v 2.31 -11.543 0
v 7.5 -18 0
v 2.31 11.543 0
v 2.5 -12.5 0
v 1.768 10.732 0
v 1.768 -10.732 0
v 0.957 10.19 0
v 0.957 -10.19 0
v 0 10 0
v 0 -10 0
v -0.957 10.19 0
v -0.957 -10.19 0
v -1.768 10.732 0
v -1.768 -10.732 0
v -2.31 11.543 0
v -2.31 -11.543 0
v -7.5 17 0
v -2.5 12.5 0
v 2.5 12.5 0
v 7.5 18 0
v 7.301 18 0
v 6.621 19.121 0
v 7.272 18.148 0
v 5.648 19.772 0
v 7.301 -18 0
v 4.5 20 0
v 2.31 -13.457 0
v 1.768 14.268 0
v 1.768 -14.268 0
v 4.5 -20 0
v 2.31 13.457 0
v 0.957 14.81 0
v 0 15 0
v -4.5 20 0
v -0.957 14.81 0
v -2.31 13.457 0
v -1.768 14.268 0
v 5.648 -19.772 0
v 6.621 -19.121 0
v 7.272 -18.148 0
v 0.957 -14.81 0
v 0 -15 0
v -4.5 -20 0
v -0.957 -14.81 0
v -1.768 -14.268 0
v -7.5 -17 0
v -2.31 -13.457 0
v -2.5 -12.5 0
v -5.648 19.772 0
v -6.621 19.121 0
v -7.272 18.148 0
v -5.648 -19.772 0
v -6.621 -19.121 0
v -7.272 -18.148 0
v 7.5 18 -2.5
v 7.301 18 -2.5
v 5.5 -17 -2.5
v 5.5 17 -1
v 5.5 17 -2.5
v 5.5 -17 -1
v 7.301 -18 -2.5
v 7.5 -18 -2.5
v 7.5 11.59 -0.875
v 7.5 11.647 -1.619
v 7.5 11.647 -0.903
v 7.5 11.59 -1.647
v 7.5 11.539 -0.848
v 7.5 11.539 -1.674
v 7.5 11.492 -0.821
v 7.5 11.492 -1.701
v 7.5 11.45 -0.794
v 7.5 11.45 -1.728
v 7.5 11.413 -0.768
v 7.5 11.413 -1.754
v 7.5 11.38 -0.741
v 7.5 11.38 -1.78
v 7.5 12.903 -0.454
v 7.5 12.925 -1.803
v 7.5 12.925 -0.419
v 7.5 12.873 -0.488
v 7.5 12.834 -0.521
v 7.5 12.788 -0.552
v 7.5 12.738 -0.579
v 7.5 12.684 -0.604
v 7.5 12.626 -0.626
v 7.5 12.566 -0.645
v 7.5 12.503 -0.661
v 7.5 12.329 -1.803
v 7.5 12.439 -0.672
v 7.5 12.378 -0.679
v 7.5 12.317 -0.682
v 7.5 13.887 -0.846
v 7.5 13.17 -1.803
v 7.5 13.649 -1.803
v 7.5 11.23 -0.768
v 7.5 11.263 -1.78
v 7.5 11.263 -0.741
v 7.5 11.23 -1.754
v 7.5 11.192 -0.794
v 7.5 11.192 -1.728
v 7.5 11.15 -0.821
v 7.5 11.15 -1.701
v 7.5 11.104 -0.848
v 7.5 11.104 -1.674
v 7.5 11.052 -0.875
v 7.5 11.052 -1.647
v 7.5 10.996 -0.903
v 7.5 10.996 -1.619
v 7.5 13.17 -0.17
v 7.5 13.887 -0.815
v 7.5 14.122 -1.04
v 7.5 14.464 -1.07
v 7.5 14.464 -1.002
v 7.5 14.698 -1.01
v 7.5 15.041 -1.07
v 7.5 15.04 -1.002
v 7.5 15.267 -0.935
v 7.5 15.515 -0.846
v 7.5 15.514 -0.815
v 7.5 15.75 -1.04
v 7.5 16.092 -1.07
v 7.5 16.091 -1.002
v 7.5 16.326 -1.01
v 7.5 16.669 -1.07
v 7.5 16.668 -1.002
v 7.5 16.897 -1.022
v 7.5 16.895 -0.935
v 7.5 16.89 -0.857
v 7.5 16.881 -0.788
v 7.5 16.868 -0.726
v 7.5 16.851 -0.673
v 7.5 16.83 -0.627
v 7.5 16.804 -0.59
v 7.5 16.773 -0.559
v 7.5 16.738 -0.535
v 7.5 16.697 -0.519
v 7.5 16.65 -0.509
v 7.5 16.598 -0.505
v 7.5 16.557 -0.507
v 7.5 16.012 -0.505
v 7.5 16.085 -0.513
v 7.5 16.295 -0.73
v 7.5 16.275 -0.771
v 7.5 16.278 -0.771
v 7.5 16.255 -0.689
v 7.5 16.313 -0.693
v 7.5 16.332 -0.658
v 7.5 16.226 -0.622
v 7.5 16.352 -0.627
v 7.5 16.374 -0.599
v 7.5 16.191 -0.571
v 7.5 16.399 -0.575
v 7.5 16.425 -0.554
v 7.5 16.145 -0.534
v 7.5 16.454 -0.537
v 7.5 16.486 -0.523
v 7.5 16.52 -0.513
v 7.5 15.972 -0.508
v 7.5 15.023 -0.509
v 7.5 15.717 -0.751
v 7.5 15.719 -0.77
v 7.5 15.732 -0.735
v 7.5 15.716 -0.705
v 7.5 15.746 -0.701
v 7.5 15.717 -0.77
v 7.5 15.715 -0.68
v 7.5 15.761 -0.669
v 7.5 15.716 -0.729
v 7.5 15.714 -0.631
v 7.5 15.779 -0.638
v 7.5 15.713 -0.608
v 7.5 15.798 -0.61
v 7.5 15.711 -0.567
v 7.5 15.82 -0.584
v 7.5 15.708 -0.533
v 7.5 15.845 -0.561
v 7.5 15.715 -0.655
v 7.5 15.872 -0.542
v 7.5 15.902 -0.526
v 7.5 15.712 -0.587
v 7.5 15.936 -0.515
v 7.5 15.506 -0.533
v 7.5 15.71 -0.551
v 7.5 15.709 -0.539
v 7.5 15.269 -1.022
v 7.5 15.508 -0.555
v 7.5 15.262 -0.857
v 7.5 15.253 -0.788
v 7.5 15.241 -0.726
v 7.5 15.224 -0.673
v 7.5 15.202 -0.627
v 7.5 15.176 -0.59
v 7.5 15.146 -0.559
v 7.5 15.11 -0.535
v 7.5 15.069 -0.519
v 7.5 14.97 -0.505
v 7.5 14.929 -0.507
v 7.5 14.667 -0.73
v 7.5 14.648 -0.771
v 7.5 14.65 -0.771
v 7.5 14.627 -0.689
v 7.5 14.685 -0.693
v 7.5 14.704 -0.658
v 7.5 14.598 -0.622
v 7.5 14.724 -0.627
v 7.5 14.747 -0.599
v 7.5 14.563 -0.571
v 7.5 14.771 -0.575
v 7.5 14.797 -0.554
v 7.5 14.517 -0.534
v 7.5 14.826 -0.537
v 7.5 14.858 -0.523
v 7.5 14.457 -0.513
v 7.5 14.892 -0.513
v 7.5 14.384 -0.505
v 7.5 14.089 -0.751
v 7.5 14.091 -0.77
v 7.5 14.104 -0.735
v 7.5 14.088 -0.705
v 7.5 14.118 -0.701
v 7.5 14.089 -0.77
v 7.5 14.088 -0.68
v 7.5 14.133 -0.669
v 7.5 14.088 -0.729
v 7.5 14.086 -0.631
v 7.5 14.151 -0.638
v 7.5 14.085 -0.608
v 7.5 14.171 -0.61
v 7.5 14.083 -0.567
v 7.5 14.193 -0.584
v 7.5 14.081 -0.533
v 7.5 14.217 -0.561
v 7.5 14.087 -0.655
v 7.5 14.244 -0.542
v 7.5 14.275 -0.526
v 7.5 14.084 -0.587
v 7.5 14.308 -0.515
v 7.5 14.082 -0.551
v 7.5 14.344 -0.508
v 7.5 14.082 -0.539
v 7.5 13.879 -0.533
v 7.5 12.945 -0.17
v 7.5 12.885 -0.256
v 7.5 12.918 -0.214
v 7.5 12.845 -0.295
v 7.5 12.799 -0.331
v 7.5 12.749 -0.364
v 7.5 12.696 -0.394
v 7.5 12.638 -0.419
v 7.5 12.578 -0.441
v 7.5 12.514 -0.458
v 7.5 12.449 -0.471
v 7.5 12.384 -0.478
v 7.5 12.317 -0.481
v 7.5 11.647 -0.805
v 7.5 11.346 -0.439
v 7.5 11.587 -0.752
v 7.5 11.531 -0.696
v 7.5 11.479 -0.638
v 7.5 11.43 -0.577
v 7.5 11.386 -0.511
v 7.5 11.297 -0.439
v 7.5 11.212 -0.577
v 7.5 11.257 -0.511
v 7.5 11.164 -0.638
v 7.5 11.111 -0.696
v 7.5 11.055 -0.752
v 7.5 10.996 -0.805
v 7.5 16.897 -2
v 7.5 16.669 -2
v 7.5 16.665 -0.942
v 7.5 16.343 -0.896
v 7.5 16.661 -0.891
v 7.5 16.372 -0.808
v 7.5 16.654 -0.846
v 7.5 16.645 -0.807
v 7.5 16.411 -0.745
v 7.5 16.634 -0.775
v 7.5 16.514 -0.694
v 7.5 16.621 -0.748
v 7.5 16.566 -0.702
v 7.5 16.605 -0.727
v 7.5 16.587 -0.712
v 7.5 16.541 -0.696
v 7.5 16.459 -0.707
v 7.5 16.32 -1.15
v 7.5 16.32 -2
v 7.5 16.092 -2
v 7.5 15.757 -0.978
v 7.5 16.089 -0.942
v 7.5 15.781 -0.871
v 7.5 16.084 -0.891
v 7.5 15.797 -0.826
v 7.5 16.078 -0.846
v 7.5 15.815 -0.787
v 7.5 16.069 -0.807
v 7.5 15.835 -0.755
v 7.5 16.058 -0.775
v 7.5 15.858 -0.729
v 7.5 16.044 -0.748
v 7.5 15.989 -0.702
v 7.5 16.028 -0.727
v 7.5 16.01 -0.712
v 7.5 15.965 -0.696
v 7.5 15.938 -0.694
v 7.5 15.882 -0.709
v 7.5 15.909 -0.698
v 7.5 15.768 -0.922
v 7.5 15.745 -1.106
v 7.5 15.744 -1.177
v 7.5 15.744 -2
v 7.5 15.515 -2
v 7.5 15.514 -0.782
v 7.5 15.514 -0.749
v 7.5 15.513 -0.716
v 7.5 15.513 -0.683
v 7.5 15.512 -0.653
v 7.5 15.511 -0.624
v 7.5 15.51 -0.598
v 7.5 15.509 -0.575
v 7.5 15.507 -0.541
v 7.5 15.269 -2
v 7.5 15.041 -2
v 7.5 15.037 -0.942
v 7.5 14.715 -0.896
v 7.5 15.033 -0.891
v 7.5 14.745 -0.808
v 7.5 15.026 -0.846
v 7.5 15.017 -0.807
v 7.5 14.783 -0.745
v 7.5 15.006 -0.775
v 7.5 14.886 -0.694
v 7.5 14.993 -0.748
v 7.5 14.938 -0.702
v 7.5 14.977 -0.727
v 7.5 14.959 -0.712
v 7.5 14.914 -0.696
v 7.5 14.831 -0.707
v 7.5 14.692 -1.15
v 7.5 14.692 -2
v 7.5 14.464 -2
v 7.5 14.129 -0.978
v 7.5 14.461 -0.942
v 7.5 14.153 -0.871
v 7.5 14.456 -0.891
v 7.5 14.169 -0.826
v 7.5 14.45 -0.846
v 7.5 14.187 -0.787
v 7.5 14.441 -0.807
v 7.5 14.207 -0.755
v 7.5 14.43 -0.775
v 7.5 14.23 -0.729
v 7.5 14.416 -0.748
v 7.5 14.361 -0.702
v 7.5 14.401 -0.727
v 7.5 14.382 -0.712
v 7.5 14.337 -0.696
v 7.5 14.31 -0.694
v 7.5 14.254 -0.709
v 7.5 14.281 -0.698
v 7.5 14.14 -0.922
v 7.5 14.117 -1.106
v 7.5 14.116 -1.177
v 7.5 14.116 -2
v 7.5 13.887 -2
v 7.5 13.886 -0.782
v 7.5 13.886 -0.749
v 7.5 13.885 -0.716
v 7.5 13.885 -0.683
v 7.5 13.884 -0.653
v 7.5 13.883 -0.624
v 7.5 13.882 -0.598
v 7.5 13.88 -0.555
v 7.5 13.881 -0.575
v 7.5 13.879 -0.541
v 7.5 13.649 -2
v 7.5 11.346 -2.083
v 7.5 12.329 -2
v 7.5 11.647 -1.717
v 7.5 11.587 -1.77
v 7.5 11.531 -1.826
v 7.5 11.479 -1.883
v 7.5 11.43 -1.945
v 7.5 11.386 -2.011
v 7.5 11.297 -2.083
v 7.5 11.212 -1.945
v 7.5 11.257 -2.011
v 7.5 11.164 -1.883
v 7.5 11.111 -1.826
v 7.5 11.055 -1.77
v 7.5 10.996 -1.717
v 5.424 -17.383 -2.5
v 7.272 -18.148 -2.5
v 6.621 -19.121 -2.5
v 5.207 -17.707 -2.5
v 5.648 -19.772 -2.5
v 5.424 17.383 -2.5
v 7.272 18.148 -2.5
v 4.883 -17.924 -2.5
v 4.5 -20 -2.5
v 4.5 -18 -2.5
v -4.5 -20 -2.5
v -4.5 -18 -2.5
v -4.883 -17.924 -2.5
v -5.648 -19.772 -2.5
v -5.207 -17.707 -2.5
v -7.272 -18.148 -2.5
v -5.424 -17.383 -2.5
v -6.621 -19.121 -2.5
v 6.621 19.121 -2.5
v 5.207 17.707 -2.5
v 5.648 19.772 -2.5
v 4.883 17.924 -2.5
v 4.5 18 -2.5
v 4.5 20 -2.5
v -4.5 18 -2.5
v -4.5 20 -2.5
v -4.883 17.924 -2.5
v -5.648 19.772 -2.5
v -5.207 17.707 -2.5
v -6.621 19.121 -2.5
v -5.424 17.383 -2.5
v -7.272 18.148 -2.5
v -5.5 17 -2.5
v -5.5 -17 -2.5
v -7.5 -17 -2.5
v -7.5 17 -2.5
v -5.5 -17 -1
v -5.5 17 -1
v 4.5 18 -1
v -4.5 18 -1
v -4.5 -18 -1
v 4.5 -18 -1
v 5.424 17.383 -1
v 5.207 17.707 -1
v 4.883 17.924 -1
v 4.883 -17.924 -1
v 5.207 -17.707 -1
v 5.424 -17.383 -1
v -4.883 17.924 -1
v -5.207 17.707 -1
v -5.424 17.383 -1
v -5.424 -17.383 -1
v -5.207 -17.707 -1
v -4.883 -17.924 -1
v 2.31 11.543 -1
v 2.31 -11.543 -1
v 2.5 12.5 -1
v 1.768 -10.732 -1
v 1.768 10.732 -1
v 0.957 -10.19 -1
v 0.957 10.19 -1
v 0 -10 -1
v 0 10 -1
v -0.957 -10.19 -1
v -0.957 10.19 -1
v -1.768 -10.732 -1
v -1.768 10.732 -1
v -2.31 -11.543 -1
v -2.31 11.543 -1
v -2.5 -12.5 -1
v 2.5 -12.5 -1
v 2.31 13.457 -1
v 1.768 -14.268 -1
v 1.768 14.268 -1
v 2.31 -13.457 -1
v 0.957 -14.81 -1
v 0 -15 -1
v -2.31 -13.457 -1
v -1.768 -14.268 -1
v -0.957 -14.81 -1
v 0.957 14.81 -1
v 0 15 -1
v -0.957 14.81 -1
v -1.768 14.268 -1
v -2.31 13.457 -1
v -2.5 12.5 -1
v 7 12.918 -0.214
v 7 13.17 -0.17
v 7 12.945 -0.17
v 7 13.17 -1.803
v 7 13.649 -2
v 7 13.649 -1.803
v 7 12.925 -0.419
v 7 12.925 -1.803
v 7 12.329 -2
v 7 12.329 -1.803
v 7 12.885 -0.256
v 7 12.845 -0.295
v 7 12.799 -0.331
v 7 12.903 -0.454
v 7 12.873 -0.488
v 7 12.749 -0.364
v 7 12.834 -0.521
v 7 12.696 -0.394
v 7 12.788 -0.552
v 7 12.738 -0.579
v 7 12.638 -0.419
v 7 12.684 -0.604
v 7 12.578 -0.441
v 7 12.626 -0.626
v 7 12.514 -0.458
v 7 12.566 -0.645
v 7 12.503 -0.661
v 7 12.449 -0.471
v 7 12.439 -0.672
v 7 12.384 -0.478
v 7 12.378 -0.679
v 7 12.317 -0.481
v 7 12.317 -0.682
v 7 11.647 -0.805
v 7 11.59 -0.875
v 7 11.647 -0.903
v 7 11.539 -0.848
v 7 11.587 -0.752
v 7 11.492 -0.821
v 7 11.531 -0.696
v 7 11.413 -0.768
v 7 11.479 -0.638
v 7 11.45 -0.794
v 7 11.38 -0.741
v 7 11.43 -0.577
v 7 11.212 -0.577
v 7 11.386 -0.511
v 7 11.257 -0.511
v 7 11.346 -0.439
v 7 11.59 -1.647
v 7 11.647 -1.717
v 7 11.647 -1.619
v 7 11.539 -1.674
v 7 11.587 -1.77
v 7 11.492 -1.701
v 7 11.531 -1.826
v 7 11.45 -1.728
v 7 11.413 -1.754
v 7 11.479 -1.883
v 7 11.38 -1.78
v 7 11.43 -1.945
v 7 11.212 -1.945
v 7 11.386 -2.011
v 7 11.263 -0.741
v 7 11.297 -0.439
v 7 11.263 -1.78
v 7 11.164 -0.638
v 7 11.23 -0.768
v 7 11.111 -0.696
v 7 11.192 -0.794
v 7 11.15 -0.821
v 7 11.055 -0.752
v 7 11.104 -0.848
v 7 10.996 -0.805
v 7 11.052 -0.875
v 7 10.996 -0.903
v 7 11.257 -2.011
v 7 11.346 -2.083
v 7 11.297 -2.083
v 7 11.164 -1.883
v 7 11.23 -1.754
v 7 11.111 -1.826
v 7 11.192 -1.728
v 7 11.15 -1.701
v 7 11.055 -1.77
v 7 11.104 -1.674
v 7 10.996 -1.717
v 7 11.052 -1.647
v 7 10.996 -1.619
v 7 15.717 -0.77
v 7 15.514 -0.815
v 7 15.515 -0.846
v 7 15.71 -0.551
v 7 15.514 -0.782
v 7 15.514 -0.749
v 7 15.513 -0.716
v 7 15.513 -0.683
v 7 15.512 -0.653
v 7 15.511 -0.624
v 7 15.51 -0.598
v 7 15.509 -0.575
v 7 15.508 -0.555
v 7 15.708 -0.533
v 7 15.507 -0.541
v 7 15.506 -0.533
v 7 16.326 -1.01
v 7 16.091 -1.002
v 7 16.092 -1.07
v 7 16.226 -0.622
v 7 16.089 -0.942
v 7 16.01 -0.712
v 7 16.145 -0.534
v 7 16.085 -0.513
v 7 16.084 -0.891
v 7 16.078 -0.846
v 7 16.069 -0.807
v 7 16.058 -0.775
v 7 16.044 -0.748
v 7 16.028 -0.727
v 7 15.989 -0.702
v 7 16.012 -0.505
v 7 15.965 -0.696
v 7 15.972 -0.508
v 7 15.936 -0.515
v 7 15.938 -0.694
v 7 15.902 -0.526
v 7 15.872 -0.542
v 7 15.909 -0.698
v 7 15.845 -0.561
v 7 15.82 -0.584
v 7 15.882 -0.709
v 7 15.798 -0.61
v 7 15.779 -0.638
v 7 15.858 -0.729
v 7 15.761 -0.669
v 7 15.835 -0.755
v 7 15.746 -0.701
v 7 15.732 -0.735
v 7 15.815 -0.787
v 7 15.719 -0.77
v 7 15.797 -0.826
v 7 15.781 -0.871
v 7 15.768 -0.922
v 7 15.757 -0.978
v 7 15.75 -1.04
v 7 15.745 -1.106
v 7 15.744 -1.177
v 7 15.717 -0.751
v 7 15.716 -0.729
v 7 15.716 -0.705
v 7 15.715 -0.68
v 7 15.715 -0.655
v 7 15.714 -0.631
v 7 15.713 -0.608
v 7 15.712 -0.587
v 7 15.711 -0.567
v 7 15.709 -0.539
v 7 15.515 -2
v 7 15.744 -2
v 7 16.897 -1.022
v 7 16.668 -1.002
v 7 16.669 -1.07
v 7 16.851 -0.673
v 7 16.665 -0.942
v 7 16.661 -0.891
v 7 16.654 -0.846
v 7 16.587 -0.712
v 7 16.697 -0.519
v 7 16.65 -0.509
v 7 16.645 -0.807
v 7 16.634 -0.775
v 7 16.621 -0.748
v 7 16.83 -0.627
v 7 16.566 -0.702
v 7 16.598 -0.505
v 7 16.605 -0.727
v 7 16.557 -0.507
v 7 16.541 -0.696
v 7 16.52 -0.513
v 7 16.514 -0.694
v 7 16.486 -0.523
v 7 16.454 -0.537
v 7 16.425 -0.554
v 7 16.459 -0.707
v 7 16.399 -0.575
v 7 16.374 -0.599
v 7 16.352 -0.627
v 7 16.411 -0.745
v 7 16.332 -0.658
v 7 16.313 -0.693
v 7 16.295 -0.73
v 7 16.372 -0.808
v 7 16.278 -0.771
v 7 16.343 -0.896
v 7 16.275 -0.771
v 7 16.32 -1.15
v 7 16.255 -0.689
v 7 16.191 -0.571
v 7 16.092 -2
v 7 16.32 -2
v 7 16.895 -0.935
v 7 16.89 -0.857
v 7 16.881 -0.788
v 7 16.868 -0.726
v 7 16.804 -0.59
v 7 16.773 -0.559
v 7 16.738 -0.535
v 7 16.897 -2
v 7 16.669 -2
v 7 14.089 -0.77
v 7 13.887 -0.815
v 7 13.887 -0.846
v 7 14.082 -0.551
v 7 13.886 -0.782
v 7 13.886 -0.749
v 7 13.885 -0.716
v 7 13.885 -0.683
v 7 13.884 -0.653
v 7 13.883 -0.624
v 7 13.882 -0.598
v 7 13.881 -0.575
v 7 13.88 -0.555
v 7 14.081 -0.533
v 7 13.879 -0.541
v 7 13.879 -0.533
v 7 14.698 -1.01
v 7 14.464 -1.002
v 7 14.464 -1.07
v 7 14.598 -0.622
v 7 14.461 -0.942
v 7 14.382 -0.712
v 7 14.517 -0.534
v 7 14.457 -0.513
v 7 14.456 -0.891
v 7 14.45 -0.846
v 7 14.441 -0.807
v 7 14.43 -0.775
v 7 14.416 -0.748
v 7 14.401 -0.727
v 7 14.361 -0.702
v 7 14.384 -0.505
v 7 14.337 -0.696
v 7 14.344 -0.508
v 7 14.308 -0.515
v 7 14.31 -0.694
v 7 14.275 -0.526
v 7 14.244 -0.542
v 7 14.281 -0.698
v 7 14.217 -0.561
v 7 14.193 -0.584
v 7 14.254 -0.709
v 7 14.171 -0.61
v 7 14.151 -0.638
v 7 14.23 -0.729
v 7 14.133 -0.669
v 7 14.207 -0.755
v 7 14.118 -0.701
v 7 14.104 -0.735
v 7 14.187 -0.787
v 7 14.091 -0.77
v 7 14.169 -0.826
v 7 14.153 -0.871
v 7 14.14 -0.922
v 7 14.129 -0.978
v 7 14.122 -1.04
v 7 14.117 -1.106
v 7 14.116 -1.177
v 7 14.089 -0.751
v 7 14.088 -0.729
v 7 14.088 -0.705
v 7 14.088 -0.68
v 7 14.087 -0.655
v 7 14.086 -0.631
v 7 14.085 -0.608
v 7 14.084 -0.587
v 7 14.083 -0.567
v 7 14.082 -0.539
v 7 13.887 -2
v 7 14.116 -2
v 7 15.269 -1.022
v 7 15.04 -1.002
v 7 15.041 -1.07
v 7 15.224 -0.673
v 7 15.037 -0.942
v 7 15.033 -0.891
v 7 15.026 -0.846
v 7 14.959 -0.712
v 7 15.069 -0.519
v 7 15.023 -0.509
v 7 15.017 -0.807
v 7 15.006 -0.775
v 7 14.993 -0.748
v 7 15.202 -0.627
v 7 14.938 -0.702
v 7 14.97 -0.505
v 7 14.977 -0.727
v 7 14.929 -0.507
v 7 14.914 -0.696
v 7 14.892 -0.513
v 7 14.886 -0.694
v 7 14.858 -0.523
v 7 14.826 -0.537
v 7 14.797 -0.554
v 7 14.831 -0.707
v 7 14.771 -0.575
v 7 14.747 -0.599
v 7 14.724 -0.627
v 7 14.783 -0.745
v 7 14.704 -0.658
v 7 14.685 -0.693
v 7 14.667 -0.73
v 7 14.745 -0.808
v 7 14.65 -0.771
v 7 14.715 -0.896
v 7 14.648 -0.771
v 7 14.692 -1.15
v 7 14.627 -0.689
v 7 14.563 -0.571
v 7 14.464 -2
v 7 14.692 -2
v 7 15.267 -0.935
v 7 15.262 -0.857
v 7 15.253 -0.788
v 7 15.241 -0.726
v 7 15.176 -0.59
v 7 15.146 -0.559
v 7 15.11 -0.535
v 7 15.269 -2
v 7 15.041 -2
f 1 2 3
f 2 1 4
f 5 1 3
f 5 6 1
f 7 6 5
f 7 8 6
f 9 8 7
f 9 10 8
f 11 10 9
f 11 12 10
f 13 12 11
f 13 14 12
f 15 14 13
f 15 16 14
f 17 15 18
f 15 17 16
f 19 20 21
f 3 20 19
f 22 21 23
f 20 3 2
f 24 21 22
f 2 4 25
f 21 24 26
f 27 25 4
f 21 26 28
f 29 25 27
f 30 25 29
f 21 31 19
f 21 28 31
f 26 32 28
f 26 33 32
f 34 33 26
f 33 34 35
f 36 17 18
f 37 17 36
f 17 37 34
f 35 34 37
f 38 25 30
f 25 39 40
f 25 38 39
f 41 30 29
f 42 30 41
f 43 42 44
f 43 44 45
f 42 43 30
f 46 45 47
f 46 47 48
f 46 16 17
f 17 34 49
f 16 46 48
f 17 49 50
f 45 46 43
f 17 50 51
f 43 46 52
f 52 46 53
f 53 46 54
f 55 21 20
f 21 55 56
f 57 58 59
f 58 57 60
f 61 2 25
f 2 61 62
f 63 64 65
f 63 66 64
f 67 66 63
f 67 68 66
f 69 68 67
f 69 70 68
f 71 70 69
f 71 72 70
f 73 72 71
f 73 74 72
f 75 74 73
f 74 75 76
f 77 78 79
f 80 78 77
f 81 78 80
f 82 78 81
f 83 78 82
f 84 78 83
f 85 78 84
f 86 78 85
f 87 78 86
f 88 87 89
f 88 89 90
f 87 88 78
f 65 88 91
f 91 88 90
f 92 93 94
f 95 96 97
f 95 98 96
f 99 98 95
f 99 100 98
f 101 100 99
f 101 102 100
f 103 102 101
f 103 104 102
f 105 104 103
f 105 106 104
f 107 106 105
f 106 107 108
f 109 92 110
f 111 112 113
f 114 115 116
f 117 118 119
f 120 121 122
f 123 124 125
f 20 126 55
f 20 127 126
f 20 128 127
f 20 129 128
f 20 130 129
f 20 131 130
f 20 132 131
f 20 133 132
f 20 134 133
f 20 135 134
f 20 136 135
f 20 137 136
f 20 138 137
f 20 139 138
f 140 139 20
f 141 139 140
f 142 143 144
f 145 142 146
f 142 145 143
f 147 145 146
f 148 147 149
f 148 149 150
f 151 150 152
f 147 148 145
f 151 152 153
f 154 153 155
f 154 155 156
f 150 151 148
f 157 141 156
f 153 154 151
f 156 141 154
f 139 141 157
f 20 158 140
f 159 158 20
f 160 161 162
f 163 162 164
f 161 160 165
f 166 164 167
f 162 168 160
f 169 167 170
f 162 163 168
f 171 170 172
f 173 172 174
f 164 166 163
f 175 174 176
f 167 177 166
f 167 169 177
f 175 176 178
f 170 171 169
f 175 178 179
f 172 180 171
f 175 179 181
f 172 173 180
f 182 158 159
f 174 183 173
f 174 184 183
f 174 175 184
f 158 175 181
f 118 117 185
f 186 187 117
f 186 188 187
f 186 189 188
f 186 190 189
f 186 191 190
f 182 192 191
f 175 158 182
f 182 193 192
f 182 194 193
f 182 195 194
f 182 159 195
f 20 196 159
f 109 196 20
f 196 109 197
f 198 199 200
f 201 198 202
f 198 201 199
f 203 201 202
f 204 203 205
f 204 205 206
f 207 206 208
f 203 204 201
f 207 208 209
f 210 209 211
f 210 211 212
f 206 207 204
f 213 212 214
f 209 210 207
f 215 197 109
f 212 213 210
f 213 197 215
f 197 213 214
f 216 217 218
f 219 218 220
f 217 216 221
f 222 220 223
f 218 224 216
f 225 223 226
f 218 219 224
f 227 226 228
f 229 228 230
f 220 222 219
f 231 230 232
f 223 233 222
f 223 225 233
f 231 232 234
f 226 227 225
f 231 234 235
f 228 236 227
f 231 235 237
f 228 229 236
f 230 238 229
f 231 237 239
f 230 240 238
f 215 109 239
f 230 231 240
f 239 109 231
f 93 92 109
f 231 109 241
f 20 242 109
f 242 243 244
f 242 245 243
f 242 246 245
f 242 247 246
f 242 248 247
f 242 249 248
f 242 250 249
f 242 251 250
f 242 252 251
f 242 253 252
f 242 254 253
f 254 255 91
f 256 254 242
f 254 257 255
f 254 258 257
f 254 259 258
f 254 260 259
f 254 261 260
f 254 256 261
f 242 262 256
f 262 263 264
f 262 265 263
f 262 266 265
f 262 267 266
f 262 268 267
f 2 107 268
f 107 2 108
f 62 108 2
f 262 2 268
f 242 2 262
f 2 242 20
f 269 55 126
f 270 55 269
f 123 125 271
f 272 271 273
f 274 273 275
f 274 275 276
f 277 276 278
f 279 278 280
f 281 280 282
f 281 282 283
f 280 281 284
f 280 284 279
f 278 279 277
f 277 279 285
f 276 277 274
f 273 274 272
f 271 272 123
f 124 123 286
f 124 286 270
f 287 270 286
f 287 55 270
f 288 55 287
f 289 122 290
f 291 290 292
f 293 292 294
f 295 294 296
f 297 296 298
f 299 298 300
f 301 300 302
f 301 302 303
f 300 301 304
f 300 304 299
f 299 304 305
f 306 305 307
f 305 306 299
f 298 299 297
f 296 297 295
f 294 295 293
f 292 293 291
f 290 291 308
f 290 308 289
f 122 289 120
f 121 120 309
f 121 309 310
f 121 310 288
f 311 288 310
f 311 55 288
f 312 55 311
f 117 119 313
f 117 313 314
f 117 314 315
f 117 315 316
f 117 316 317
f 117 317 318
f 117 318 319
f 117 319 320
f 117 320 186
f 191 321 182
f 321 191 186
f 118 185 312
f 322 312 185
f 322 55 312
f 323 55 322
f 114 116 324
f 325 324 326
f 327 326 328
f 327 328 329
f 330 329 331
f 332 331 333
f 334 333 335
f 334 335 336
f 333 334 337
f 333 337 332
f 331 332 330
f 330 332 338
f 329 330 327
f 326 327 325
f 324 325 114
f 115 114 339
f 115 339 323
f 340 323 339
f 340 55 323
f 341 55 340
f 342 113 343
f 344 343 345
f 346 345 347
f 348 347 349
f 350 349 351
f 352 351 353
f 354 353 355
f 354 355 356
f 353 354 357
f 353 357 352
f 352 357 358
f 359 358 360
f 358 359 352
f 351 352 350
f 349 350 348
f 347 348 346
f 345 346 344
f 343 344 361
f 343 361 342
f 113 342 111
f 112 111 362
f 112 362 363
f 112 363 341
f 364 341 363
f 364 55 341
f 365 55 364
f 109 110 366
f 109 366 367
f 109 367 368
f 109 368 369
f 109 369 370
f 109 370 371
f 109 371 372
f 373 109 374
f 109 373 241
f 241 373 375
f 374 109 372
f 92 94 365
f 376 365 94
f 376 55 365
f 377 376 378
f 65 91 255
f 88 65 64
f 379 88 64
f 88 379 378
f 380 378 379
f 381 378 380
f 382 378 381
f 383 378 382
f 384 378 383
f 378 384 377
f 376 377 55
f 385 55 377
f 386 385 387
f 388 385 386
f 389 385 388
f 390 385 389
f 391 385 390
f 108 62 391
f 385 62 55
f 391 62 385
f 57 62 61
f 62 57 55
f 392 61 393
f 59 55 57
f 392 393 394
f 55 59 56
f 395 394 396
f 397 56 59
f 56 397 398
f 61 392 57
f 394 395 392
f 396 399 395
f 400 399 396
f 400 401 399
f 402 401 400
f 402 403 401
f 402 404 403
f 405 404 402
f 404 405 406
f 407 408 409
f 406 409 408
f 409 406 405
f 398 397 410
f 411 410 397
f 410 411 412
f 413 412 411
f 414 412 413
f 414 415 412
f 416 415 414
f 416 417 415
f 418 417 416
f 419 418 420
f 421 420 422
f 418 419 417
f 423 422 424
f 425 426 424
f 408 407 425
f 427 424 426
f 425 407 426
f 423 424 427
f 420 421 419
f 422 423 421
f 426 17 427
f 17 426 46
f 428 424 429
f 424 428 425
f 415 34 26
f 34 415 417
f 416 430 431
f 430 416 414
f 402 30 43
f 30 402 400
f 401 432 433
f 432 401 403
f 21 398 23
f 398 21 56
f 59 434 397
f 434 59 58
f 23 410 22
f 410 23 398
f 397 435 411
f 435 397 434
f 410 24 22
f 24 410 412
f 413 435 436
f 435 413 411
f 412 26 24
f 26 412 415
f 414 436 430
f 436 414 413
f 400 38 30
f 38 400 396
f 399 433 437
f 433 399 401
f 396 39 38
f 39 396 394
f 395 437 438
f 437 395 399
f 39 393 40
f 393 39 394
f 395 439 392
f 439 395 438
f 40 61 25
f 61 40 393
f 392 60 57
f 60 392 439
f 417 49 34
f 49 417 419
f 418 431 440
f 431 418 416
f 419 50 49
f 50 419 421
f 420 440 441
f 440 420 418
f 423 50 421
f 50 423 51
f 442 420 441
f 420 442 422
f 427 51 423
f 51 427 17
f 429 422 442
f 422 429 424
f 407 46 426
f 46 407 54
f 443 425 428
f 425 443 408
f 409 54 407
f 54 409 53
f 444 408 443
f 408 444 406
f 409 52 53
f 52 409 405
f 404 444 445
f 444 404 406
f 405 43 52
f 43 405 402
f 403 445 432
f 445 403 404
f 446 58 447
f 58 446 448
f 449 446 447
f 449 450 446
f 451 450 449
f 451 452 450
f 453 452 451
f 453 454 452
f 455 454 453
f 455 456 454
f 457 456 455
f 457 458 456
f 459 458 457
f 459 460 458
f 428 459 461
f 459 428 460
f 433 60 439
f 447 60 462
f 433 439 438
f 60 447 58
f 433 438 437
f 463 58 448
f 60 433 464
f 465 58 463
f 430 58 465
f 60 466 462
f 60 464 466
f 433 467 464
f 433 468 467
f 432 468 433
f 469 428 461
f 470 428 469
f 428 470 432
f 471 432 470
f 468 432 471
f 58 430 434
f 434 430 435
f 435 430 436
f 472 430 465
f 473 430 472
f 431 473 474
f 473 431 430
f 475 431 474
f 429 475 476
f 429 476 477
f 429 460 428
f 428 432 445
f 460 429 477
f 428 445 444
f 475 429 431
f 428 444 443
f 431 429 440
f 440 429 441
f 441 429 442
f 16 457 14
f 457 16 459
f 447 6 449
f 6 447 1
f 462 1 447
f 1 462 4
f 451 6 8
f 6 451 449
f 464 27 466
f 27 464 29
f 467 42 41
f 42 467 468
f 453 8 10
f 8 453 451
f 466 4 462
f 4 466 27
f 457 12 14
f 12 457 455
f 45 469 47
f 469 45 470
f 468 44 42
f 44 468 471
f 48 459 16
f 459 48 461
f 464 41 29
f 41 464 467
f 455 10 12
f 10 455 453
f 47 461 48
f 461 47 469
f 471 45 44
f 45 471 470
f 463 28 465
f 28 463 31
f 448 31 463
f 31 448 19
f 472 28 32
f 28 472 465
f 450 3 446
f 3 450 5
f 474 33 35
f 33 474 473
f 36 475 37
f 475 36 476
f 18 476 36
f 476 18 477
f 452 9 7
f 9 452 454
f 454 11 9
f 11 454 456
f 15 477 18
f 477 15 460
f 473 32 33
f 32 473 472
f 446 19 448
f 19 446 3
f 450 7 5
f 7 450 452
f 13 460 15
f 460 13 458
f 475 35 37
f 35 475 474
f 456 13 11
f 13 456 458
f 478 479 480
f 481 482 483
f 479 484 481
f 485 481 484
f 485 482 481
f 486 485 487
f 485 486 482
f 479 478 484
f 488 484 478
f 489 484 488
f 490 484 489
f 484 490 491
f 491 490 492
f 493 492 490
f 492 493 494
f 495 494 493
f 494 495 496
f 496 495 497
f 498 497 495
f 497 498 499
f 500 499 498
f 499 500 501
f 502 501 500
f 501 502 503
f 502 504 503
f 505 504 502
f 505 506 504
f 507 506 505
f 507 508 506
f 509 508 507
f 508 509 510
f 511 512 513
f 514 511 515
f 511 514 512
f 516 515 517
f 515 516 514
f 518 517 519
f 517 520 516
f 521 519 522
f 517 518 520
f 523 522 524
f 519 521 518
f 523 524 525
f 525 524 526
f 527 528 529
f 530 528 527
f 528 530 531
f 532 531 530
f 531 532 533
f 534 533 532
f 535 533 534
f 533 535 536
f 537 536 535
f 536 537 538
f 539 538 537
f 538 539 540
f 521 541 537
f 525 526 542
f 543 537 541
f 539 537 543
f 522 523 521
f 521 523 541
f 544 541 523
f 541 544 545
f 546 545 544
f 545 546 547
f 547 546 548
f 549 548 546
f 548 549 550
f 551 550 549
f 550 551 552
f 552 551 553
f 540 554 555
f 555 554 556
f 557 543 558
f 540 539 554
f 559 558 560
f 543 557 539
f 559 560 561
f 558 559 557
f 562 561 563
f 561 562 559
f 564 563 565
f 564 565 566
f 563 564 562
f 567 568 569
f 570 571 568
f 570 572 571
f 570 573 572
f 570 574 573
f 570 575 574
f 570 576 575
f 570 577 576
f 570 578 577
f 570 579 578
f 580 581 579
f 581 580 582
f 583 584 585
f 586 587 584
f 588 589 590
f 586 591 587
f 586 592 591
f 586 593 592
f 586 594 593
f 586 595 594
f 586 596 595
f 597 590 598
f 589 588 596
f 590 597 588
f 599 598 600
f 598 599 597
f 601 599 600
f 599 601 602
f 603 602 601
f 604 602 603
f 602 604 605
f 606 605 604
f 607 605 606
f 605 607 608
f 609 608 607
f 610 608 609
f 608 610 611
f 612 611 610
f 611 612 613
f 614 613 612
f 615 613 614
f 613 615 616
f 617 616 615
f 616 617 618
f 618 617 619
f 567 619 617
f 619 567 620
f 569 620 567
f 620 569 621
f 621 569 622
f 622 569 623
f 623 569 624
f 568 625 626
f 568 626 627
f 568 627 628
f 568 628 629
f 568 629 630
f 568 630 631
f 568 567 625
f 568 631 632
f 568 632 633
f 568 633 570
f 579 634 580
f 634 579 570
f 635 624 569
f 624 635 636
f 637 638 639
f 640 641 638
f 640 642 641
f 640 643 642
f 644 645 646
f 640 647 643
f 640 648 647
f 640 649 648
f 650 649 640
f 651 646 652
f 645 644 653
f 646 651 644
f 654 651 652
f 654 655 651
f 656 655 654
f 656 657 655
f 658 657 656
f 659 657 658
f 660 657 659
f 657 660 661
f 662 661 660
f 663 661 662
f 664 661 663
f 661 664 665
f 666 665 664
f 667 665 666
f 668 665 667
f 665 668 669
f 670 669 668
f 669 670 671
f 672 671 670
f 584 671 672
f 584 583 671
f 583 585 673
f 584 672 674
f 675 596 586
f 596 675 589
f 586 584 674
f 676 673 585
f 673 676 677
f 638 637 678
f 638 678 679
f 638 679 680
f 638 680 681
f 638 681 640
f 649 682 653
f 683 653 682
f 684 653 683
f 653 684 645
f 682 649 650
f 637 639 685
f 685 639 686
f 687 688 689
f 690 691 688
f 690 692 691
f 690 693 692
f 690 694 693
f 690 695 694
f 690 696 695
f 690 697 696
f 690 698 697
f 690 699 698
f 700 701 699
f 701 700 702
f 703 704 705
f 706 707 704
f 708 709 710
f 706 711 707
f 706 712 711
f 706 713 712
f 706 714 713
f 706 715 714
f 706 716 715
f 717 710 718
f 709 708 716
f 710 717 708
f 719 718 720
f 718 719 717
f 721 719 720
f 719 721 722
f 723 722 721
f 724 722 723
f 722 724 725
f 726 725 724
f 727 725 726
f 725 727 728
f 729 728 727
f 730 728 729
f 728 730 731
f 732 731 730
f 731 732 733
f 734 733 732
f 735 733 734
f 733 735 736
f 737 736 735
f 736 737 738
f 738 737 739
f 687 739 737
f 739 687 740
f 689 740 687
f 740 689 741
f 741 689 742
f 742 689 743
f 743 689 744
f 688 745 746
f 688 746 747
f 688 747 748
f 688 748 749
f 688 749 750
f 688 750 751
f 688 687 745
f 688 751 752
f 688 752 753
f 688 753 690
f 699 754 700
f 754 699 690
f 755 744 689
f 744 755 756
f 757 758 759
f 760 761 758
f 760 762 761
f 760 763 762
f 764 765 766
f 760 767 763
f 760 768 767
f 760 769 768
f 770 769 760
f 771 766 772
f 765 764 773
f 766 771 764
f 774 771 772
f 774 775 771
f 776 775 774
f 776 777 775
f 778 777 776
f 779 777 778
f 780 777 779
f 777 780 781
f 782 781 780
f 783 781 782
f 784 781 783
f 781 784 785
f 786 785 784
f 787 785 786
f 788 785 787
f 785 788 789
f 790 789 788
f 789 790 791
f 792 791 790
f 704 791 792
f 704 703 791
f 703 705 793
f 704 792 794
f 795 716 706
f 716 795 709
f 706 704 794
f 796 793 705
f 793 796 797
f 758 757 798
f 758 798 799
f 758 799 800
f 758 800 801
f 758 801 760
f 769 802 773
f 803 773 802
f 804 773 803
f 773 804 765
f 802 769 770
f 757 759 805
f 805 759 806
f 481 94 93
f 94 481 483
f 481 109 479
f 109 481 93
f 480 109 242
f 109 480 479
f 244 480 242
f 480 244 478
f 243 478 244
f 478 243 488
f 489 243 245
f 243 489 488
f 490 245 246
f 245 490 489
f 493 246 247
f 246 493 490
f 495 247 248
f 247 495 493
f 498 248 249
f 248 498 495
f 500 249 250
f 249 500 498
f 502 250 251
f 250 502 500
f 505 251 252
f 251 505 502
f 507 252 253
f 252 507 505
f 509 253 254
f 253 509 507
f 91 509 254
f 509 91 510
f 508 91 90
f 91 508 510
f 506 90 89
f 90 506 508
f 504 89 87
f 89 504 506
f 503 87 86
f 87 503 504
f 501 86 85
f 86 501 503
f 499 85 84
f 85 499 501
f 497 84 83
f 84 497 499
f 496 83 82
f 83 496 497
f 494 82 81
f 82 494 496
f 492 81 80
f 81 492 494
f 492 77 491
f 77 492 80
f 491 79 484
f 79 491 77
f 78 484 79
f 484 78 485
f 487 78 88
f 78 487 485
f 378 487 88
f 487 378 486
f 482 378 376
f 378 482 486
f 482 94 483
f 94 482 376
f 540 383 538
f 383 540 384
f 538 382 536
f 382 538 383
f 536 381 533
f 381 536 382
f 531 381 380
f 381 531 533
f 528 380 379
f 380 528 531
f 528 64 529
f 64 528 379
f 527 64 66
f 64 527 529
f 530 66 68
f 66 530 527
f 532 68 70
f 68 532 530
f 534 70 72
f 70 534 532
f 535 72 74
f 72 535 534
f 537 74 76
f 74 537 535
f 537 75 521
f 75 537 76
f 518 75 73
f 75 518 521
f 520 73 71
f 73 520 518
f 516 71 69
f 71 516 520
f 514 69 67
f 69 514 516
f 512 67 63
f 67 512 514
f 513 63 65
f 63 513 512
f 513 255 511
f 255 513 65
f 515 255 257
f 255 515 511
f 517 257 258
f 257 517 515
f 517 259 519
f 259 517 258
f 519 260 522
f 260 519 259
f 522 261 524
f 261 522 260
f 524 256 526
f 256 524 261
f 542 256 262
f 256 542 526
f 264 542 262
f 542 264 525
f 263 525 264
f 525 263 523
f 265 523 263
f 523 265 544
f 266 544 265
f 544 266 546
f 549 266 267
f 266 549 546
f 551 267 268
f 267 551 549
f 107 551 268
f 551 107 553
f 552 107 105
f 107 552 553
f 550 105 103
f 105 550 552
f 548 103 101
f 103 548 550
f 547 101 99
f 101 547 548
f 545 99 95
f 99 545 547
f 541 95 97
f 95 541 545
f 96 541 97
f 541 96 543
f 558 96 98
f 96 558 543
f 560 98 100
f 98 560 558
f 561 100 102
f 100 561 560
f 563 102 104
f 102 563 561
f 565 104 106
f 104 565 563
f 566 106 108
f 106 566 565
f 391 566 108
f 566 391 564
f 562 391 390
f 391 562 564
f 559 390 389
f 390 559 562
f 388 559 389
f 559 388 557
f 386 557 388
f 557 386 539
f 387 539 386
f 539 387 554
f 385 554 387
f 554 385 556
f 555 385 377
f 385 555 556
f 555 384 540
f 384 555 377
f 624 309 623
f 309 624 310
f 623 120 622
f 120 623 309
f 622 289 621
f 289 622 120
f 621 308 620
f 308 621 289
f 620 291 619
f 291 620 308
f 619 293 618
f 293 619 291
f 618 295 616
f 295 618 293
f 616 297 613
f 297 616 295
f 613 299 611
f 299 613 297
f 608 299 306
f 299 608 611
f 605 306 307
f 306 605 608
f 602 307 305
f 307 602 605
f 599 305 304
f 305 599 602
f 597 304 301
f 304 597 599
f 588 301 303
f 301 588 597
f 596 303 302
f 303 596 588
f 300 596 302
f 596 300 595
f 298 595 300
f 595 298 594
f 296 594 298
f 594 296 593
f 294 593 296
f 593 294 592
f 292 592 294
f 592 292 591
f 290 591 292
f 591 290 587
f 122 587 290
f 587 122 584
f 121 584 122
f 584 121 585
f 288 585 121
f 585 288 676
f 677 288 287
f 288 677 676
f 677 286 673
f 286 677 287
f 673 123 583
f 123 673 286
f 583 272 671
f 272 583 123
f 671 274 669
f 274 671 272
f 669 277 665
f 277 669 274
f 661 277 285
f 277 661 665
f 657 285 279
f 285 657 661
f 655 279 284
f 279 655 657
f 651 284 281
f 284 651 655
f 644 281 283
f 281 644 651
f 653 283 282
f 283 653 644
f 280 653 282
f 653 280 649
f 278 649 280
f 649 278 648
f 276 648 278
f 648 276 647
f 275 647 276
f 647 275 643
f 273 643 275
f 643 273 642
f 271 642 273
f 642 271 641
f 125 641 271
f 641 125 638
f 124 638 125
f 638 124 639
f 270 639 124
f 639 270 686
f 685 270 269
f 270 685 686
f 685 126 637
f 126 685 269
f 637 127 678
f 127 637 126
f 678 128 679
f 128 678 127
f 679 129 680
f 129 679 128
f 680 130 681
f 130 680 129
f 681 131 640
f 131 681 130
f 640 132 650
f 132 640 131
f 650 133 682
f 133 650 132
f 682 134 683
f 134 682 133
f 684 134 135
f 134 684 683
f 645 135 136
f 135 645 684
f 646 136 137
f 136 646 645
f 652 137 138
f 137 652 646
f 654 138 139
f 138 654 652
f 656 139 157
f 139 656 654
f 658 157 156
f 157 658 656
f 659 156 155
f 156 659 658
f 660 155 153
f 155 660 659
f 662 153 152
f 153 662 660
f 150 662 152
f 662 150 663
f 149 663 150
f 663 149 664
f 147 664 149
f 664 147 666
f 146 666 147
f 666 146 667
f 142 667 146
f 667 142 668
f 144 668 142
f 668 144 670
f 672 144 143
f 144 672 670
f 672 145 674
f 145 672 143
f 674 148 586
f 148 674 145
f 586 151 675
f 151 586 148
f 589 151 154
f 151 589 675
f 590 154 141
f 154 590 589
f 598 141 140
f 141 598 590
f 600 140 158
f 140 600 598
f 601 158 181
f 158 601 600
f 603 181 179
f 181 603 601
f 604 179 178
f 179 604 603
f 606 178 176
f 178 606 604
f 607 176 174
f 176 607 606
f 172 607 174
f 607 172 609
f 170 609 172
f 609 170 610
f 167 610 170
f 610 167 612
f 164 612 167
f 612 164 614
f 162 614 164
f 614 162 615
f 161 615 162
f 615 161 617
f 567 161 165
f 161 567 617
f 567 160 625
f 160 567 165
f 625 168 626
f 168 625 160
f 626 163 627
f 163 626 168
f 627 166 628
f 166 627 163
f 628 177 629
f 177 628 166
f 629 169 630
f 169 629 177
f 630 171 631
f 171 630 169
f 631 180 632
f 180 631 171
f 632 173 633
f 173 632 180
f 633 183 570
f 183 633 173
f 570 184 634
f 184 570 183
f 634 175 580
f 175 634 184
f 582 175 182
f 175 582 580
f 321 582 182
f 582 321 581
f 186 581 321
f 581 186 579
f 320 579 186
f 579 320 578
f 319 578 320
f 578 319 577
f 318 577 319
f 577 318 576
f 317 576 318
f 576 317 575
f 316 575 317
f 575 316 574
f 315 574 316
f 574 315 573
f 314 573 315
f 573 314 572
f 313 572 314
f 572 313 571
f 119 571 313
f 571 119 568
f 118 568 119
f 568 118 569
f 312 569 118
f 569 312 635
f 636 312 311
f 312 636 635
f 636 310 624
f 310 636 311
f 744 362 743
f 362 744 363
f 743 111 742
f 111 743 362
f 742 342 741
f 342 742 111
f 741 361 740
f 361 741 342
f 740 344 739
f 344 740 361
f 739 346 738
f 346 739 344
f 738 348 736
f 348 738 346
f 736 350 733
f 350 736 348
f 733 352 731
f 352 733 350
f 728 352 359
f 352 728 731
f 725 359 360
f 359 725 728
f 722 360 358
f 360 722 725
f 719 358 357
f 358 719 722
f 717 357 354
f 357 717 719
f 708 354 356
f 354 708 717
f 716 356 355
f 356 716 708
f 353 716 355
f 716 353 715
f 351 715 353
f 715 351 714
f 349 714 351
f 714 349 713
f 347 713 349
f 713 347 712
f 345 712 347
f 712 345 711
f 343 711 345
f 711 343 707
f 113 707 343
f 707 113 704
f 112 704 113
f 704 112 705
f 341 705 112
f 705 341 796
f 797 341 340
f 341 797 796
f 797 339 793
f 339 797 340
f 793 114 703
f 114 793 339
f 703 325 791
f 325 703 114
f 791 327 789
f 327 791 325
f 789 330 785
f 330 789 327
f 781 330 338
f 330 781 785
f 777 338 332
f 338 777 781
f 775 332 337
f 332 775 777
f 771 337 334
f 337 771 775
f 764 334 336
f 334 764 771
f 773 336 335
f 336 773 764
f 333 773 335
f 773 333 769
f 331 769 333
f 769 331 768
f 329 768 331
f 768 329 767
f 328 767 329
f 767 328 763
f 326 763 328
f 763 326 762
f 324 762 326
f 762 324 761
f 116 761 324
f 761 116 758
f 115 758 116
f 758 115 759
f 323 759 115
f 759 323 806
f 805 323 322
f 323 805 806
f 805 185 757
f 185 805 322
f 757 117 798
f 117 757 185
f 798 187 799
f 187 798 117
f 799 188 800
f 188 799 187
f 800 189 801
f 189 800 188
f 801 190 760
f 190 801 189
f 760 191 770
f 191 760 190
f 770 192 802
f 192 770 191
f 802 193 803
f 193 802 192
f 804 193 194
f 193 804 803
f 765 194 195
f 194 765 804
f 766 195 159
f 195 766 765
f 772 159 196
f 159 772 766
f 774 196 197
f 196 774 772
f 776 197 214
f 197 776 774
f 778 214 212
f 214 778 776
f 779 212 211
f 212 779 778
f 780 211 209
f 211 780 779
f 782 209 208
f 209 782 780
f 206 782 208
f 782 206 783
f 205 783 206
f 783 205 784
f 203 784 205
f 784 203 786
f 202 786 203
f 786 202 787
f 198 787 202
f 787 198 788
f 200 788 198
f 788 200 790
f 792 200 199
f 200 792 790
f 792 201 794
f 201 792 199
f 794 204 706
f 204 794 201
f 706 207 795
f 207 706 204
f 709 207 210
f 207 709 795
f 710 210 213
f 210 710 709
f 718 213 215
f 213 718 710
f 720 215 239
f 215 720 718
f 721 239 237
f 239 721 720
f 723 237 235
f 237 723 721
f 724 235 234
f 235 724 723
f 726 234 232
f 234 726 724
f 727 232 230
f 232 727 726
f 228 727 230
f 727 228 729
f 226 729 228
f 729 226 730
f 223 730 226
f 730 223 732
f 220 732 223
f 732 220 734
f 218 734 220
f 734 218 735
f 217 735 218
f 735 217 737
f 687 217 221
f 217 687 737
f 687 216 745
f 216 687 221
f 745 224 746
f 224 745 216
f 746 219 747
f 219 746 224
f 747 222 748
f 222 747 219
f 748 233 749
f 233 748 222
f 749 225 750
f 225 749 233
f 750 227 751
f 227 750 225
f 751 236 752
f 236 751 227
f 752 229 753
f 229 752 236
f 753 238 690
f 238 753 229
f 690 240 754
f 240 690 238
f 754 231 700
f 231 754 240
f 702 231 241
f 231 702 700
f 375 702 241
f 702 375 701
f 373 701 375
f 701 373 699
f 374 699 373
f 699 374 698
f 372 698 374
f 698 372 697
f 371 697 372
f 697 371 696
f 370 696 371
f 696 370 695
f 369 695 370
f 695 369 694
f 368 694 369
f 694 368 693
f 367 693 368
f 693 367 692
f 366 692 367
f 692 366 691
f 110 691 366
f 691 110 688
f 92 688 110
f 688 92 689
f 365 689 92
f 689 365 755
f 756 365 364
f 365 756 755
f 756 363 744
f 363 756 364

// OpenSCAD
hole_radius= 2.5;
hole_pitch= 25;
min_depth= 2.5;
padding=5;
board_width = hole_radius*2 + padding*2;
board_height = hole_pitch + hole_radius*2 + padding*2;
edge_width = 2;
edge_radius = 3;
eps=0.01;
$fn=16;
height=1;
module pegboard_sample(depth) {
    edge_height = max(depth, min_depth);
    module pegboard_sample_base() {
        translate([0, 0, -depth/2]) linear_extrude(depth, center=true) hull() {
            translate([edge_radius - board_width/2, edge_radius - board_height/2, 0]) circle(edge_radius);
            translate([edge_radius - board_width/2, board_height/2 - edge_radius, 0]) circle(edge_radius);
            translate([board_width/2 - edge_radius, edge_radius - board_height/2, 0]) circle(edge_radius);
            translate([board_width/2 - edge_radius, board_height/2 - edge_radius, 0]) circle(edge_radius);
        }
        
    }
    module pegboard_sample_edge() {
        translate([0, 0, -edge_height/2]) union() {
            translate([board_width/2 - edge_width/2, 0, 0]) rotate([90, 0, 0]) linear_extrude(board_height - 2*edge_radius + edge_width, center=true) square([edge_width, edge_height], center=true);
            translate([edge_width/2-board_width/2, 0, 0]) rotate([90, 0, 0]) linear_extrude(board_height - 2*edge_radius, center=true) square([edge_width, edge_height], center=true);
            translate([0, board_height/2 - edge_width/2, 0]) rotate([90, 0, 270]) linear_extrude(board_width - 2*edge_radius, center=true) square([edge_width, edge_height], center=true);
            translate([0, edge_width/2 - board_height/2 , 0]) rotate([90, 0, 90]) linear_extrude(board_width - 2*edge_radius, center=true) square([edge_width, edge_height], center=true);
            translate([board_width/2 - edge_radius, board_height/2 - edge_radius, 0]) rotate_extrude(angle=90) translate([edge_radius - edge_width/2, 0, 0]) square([edge_width, edge_height], center=true);
            translate([board_width/2 - edge_radius, edge_radius - board_height/2 , 0]) rotate([0, 0, -90]) rotate_extrude(angle=90) translate([edge_radius - edge_width/2, 0, 0]) square([edge_width, edge_height], center=true);
            translate([edge_radius - board_width/2, board_height/2 - edge_radius, 0]) rotate([0, 0, 90])  rotate_extrude(angle=90) translate([edge_radius - edge_width/2, 0, 0]) square([edge_width, edge_height], center=true);
            translate([edge_radius - board_width/2, edge_radius - board_height/2, 0]) rotate([0, 0, 180 ])rotate_extrude(angle=90) translate([edge_radius - edge_width/2, 0, 0]) square([edge_width, edge_height], center=true);
        }
    }
    module pegboard_sample_hole() {
        translate([0, -hole_pitch/2, -depth/2]) cylinder(h=depth*2, r = hole_radius, center=true);
        translate([0, hole_pitch/2, -depth/2]) cylinder(h=depth*2, r = hole_radius, center=true);
    }
    module pegboard_sample_label() {
        translate([board_width/2, board_height/2-edge_radius, - edge_height*0.8]) rotate([90, 0, 90])linear_extrude(1, center=true)    text(str("↕", depth, "mm"), size=edge_height*0.8, halign="right", valign="baseline", font="Liberation Mono:style=Regular");
    }

        difference() {
            union() {
            pegboard_sample_edge();
            pegboard_sample_base();
            }
            union() {
            pegboard_sample_hole();
            pegboard_sample_label();
        }
    }
        
}

pegboard_sample(height);
